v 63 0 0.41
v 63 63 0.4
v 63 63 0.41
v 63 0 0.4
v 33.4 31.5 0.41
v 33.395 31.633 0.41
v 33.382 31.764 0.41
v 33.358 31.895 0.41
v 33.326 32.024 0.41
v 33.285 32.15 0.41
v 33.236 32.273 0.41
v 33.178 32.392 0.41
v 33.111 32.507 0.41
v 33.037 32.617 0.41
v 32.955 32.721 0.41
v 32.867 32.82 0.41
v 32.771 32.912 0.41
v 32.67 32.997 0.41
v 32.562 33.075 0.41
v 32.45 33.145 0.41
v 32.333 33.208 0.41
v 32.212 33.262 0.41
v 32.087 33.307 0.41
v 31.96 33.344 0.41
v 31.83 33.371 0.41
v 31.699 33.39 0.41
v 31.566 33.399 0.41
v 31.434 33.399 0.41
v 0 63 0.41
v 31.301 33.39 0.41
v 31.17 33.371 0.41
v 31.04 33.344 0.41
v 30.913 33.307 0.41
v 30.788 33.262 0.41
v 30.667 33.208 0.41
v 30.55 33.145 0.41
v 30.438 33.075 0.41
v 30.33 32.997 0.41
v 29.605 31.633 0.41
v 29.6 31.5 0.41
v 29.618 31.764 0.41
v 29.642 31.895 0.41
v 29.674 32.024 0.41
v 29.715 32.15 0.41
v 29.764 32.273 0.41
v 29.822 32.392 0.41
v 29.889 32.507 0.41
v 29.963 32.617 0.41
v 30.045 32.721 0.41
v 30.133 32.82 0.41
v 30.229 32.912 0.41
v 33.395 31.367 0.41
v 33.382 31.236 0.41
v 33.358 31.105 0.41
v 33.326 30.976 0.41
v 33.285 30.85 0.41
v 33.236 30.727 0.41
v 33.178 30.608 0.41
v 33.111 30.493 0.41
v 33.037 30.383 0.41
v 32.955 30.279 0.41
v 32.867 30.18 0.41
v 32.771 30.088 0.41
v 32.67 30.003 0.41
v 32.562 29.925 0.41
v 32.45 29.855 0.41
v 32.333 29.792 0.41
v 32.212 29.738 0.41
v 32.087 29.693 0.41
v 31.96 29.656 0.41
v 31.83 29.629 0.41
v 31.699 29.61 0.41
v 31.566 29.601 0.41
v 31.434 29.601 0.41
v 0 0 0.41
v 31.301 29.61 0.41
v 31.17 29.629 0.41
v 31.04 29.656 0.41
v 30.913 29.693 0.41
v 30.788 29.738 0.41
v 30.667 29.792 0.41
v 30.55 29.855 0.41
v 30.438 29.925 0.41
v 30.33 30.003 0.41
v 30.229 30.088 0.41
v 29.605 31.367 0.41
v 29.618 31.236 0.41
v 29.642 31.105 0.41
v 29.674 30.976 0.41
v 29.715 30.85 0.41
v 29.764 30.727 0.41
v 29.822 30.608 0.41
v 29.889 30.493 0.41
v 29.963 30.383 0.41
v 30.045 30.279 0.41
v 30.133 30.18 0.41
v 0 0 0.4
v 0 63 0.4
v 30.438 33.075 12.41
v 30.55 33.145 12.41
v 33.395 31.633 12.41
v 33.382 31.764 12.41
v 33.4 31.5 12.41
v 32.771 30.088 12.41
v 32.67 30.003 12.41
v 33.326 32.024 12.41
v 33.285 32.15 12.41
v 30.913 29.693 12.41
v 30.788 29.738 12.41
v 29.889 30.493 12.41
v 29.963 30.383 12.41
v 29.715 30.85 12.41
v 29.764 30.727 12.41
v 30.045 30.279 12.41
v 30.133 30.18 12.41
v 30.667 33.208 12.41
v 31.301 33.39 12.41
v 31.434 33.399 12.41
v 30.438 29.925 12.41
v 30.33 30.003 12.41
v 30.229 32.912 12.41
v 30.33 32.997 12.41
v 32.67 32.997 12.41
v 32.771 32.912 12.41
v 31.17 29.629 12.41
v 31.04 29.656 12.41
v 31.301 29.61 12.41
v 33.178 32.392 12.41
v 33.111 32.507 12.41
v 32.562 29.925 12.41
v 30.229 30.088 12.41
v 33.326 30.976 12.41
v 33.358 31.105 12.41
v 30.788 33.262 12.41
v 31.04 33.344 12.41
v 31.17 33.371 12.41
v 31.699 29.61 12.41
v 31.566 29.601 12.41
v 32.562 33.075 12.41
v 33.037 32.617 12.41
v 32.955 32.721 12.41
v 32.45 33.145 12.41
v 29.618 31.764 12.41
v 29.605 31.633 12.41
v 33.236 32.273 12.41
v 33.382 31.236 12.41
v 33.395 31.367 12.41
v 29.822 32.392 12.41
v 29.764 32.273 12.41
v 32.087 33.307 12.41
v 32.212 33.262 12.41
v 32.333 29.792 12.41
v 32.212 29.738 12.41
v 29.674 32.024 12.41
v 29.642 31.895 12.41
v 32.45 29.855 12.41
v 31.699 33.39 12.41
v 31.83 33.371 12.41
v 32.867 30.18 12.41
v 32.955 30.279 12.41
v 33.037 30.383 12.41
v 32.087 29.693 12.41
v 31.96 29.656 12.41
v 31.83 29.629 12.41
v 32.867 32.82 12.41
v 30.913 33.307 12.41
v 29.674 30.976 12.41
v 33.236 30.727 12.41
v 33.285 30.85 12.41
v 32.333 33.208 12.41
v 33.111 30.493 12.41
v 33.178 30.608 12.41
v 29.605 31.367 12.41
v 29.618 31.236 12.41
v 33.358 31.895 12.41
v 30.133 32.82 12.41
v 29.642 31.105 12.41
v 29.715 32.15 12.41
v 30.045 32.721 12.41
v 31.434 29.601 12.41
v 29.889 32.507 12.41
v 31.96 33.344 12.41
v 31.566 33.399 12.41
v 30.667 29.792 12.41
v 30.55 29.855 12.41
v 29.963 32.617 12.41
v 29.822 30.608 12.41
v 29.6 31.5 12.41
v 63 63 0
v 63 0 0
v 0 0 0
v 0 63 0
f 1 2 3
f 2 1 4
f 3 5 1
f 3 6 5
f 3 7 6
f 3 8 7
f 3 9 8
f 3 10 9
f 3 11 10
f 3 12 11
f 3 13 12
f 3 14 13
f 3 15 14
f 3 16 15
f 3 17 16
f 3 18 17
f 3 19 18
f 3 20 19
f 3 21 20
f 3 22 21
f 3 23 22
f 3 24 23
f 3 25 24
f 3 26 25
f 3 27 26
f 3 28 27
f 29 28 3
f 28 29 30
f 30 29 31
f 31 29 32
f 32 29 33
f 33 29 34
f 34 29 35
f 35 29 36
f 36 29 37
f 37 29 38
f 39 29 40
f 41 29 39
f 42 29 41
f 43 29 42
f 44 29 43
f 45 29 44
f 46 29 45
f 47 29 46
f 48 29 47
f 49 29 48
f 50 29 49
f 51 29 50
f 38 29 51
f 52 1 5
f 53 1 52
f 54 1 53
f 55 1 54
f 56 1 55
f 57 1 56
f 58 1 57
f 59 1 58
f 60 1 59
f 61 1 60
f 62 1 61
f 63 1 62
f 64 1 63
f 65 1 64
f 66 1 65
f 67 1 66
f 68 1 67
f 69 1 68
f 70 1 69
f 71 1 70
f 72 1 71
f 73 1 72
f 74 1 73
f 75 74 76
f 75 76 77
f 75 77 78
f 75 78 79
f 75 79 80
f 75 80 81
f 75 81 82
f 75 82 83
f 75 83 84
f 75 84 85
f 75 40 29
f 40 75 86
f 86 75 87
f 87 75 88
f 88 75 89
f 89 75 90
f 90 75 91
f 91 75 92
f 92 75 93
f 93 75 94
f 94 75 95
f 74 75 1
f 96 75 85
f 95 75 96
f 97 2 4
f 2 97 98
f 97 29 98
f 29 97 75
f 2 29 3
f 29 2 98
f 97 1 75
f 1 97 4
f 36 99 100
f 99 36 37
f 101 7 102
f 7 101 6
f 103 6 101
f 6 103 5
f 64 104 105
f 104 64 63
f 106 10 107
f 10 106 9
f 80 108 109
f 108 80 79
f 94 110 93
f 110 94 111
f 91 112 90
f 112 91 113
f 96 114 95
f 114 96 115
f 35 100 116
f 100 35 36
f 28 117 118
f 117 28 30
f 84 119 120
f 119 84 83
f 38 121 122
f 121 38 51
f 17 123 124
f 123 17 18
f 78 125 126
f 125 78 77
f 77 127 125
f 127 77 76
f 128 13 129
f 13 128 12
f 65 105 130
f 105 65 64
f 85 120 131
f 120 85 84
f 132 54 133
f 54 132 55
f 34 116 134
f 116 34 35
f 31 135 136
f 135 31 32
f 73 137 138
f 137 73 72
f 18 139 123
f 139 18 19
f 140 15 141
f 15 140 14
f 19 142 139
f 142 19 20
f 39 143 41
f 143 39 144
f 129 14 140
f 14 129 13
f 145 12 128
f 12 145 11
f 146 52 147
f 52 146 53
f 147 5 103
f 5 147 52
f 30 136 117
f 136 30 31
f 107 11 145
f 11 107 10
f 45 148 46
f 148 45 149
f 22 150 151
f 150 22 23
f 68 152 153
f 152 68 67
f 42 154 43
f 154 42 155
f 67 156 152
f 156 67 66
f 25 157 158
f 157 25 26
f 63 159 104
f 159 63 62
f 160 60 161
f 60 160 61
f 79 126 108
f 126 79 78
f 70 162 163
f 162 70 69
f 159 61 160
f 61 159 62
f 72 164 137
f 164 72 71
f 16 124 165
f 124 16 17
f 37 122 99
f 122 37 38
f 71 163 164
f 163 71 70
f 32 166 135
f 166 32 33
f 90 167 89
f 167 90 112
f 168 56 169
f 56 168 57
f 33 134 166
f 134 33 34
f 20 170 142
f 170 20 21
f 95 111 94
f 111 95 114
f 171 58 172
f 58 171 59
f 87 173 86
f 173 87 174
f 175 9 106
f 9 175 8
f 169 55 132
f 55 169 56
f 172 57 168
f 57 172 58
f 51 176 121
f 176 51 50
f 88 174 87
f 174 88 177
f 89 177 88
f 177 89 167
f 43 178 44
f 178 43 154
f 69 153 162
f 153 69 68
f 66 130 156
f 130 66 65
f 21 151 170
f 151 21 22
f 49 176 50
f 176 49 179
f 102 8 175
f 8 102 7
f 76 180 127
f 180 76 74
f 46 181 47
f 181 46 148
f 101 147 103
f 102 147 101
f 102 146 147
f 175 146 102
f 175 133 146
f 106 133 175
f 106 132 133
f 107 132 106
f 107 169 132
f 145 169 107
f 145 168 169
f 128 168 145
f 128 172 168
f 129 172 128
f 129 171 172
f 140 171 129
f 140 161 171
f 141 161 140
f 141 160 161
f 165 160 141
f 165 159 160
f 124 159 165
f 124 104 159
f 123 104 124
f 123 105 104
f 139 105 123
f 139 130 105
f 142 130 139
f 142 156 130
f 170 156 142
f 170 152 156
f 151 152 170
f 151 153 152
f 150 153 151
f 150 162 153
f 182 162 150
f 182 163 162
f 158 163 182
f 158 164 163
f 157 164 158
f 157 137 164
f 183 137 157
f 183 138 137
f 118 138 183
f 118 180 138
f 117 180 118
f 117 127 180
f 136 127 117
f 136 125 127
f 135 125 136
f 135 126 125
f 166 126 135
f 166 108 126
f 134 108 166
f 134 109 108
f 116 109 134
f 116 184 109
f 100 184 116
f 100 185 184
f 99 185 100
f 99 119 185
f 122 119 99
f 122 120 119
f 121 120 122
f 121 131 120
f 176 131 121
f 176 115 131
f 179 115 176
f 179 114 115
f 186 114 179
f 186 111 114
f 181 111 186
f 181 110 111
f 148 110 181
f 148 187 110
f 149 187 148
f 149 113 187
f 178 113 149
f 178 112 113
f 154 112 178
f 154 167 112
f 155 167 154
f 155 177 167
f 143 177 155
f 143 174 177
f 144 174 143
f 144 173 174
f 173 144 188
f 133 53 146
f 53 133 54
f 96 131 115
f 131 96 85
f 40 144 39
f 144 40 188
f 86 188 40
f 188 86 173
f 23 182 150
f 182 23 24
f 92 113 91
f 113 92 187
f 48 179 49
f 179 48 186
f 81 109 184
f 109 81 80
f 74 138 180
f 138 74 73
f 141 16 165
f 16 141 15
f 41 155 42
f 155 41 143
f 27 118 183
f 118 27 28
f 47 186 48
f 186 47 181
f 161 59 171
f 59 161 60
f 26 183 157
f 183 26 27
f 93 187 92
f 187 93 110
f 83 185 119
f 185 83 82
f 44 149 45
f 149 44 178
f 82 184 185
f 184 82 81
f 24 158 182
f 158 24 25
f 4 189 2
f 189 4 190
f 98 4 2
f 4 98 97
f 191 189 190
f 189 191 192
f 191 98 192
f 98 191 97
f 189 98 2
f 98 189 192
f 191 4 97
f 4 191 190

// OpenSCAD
// file: ../../Base/Rotation.scad
// Fischertechnik Box Foundation
// Geometry Helpers Rotation

include <PlacementOptions.scad>

// getRotatedSpace(space, rotation=NoRotation)
// Rotates the space dependent on the specified rotation

function getRotatedSpace(space, rotation=NoRotation) = [
    (rotation == Rotate90 || rotation == Rotate270) ? space.y : space.x,
    (rotation == Rotate90 || rotation == Rotate270) ? space.x : space.y
];

// Rotates the given space around the fixed left lower corner
// space = the space the children needs as width/depth list [width,depth]
// rotation = 0 Rotate0 degrees, 1 Rotate90 degrees, 2 Rotate180 degrees, 3 Rotate270 degrees (equivalent to -90)

module RotateFix(space, rotation=NoRotation) {
    dy = (rotation == Rotate0 || rotation == Rotate270) ? 0 :
        (rotation == Rotate90) ? space.x :
        space.y;
    dx = (rotation < Rotate180) ? 0 :
        (rotation == Rotate180) ? space.x :
        space.y;
    
    translate([dx, dy, 0])
        rotate([0, 0, rotations[rotation]])
            children();
}
// file: ../../Base/Alignment.scad
// Fischertechnik Box Foundation
// Geometry Helpers Alignment

include <PlacementOptions.scad>

// getAlignedX(elementWidth, spaceWidth, align=AlignRight, offset=0)
// Gets the aligned X offset of an element with the given
// width in the given space.
// elementWidth = The width of the element to positon
// spaceWidth = The space where the element should be aligned
// align = 0 AlignLeft, 1 AlignCenter, 2 AlignRight
// offset = an optional offset from the aligned position. When
// aligned left or centered, then positive values are in X direction.
// When aligned right then positive values are in negative X direction.

function getAlignedX(elementWidth, spaceWidth, align=AlignRight, offset=0) =
    (align == AlignLeft) ?
        offset :
        ((align == AlignCenter) ?
        (spaceWidth - elementWidth)/2 + offset :
        spaceWidth - offset - elementWidth);

// getAlignedY(elementDepth, spaceDepth, align=AlignTop, offset=0)
// Gets the aligned Y offset of an element with the given
// depth in the given space.
// elementDepth = The depth of the element to positon
// spaceDepth = The space where the element should be aligned
// align = 0 AlignBottom, 1 AlignCenter, 2 AlignTop
// offset = an optional offset from the aligned position. When
// aligned bottom or centered, then positive values are in Y direction.
// When aligned top then positive values are in negative Y direction.

function getAlignedY(elementDepth, spaceDepth, align=AlignTop, offset=0) =
    (align == AlignBottom) ?
        offset :
        ((align == AlignCenter) ?
        (spaceDepth - elementDepth)/2 + offset :
        spaceDepth - offset - elementDepth);
// file: ../../Base/PlacementOptions.scad
// Fischertechnik Box Foundation
// Placement Options

// Alignment
NoAlign = 0;
AlignLeft = 1;
AlignBottom = 2;
AlignCenter = 3;
AlignRight = 4;
AlignTop = 5;

// Element rotation degree steps
rotations = [0, -90, -180, -270];

// Rotation
NoRotation = 0;
Rotate0 = 0;
Rotate90 = 1;
Rotate180 = 2;
Rotate270 = 3;

// Docking (seen from above)
NoDock = -1;
DockLeft = 0;
DockTop = 1;
DockRight = 2;
DockCorner = 2;
DockBottom = 3;

// Web corners
LowerLeft = 0;
UpperLeft = 1;
UpperRight = 2;
LowerRight = 3;

// Web position relative to corner
LeftOfCorner = 0;
RightOfCorner = 1;
// file: ../../Base/Boxes.scad
// Fischertechnik Box Foundation
// Pre-designed Boxes

use <Constants.scad>

include <PlacementOptions.scad>

box190Width = 190;
box190Depth = 130;
box130Width = 130;
box130Depth = 95;

// Values are from an original ec3 box
topBottomDifference = 1.5;
outerHeight = 40;
innerHeight = 38.2;
baseThickness = outerHeight - innerHeight;
stackExcess = 5.7;
radius = 3.5;
wallThickness = 1.5;
tolerance = 0.2;
stackOffset = innerHeight - stackExcess;

boxUsageHeight = stackOffset;
boxWallThickness = wallThickness;
boxBaseThickness = baseThickness;
boxWebWidth = 3.0;

// getBoxWallThickness()
// Gets the wall thickness of a Fischertechnik Box
function getBoxWallThickness() = boxWallThickness;

// getBoxUsageHeight()
// Gets the usable height of a Fischertechnik box
function getBoxUsageHeight() = boxUsageHeight;

// getBoxInnerHeight()
// Gets the inner height of a Fischertechnik box, including the stack excess
function getBoxInnerHeight() = innerHeight;

// getBoxBaseThickness()
// Gets the thickness of the Fischertechnik box base.
function getBoxBaseThickness() = boxBaseThickness;

// getBoxWebWidth()
// Gets the width of a box web
function getBoxWebWidth() = boxWebWidth;

// getBox190Space()
// Gets the usable inner space of a Box 190 as an x/y-list
function getBox190Space() = [
    box190Width - 2*getBoxWallThickness() - topBottomDifference, 
    box190Depth - 2*getBoxWallThickness() - topBottomDifference ];

// BoxBase(width, depth)
// Creates an empty stackable Fischertechnik compatible box
// width = Outer width of the box (190, 130, ...)
// depth = Outer depth of the box (130, 95, ...)

module BoxBase(width, depth, height=outerHeight) {    
    thinPlate = 0.01;

    innerHeight = height - baseThickness;    
    
    module BodyPlate(width, depth) {
        translate([radius, radius])
        hull() {
            w = width-2*radius;
            d = depth-2*radius;
            cube([w, d, thinPlate]);
            cylinder(thinPlate, r=radius, $fn=getFragments());
            translate([w, 0])
                cylinder(thinPlate, r=radius, $fn=getFragments());
            translate([w, d])
                cylinder(thinPlate, r=radius, $fn=getFragments());
            translate([0, d])
                cylinder(thinPlate, r=radius, $fn=getFragments());
        }
    }
    
    module Body(tolerance=tolerance) {
        hull() {
            // Bottom with tolerance to fit into the original boxes when stacked
            translate([-wallThickness+tolerance, -wallThickness+tolerance, -baseThickness])
                BodyPlate(width-topBottomDifference-2*tolerance, depth-topBottomDifference-2*tolerance);
            
            // Top
            translate([-wallThickness-topBottomDifference/2, -wallThickness-topBottomDifference/2, innerHeight-thinPlate])
                BodyPlate(width, depth);
         }
    }

    module Cutoff() {
        hull() {
            coWidth = width - 2*wallThickness;
            coDepth = depth - 2*wallThickness;
            
            // Bottom
            BodyPlate(coWidth-topBottomDifference, coDepth-topBottomDifference);

            // Top
            translate([-topBottomDifference/2, -topBottomDifference/2, innerHeight+thinPlate]) 
                BodyPlate(coWidth, coDepth);
        }
    }
    
    difference() {        
        Body();
        Cutoff();
        stackOffset = innerHeight - stackExcess;
        translate([0, 0, stackOffset + baseThickness])
            Body(tolerance=0);
    }
}

// Creates the Fischertechnik empty box 130x190 mm and places it at position 0,0
// 190x130 are the outer sizes, the inner space is slightly smaller. Use getBox190Space() to get the inner sizes.
// The box is positioned that the usable inner space is at the 0,0,0 position. The

module Box190() {
    BoxBase(box190Width, box190Depth);
}

// Gets the usable inner space of a Box 130 as an x/y-list
function getBox130Space() = [
    box130Width - 2*getBoxWallThickness() - topBottomDifference, 
    box130Depth - 2*getBoxWallThickness() - topBottomDifference ];

// Creates the Fischertechnik empty box 95x130 mm and places it at position 0,0
// 190x130 are the outer sizes, the inner space is slightly smaller. Use getBox190Space() to get the inner sizes.
// The box is positioned that the usable inner space is at the 0,0,0 position. The

module Box130() {
    BoxBase(box130Width, box130Depth);
}

// Creates a web at the specified box walls
// corner 0 = LowerLeft, 1 = UpperLeft, 2 = UpperRight, 3 = LowerRight
// side 0 = LeftOfCorner, 1 = RightOfCorner
// distance = Distance in mm from the corner
// boxSpace = inner width and depth of the box (default: Box 190)
// webWidth = length of the web (default is 3 mms)
// webThickness = thickness of the web (default is 1 mm)

module BoxWeb(corner, side, distance, boxSpace=getBox190Space(), webWidth=getBoxWebWidth(), webThickness=1.0) {
    sink = getBoxWallThickness()/2;

    width = (corner % 2 == 0) ? 
            (side == LeftOfCorner ? webWidth : webThickness) :
            (side == LeftOfCorner ? webThickness : webWidth);

    depth = (corner % 2 == 0) ? 
            (side == RightOfCorner ? webWidth : webThickness) :
            (side == RightOfCorner ? webThickness : webWidth);
    
    xDiff = corner == LowerLeft ? 
                (side == LeftOfCorner ? -sink : distance) :
            (corner == UpperLeft ?                
                (side == LeftOfCorner ? distance : -sink) :
            (corner == UpperRight ?
                (side == LeftOfCorner ? boxSpace.x-webWidth+sink : boxSpace.x-distance-webThickness) :
                (side == LeftOfCorner ? boxSpace.x-distance-webThickness: boxSpace.x-webWidth+sink)));

    yDiff = corner == LowerLeft ? 
                (side == RightOfCorner ? -sink : distance) :
            (corner == UpperLeft ?
                (side == RightOfCorner ? boxSpace.y-distance : boxSpace.y-webWidth+sink) :
            (corner == UpperRight ?
                (side == RightOfCorner ? boxSpace.y-webWidth+sink : boxSpace.y-distance) :
                (side == RightOfCorner ? distance : -sink)));
    
    translate([xDiff, yDiff, -getExcess()])
        cube([width, depth, boxUsageHeight + 2*getExcess()]);
}
// file: ../../Base/Placement.scad
// Fischertechnik Box Foundation
// Geometry Helpers Placement

use <Constants.scad>
use <Alignment.scad>
use <Rotation.scad>
use <Boxes.scad>

include <PlacementOptions.scad>

// Place(x=0, y=0, elementSpace=[0,0], alignX=AlignLeft, alignY=AlignBottom, rotation=Rotate0, boxSpace=getBox190Space())
// Places the child at the specified position
// y = Y-Position. This is a relative position when an X aligment is specified.
// x = X-Position. This is a relative position when an Y aligment is specified.
// elementSpace = space of the element to be placed [x,y]
// alignX = -1=NoAlign, 0 AlignLeft, 1 AlignCenter, 3 AlignRight (elementSpace and boxSpace required!)
// alignY = -1=NoAlign, 2 AlignBottom, 1 AlignCenter, 4 AlignTop (elementSpace and boxSpace required!)
// rotation = 0 Rotate0 0 degrees, 1 Rotate90 90 degrees, 
// 2 Rotate180 180 degrees, 3 Rotate270 270 degrees (equivalent to -90)
// boxSpace = Inner space of the box where the placement occurs [x,y] - default is Box 190x130 inner space

module Place(x=0, y=0, elementSpace=[0,0], 
  alignX=AlignLeft, alignY=AlignBottom, 
  rotation=NoRotation, boxSpace=getBox190Space()) {

    module Position(x, y, space, rotation=Rotate0) {
        translate([x, y, 0])
            RotateFix(space, rotation)
                children();
    }

    space = getRotatedSpace(elementSpace, rotation);
    alignedX = getAlignedX(space.x, boxSpace.x, alignX, x);
    alignedY = getAlignedY(space.y, boxSpace.y, alignY, y);
    Position(alignedX, alignedY, elementSpace, rotation)
        children();
}

// Center(space=getBox130Space(), elementSpace=[0,0])
// space = Space where the children is centered. For cylinder use centered=true and no elementSpace.
// elementSpace = space of the element to be centered [x,y]

module Center(space=getBox190Space(), elementSpace=[0,0]) {
    Place(elementSpace=elementSpace, boxSpace=space, alignX=AlignCenter, alignY=AlignCenter)
        children();
}

// CenterHorizontal(width=0, y=0, offset=0, space=getBox130Space())
// width = Width of the element to be placed.
// y = Y position of the element
// offset = Offset from the center position (negative will be left of the center)
// space = Space where the element is placed

module CenterHorizontal(width=0, y=0, offset=0, space=getBox190Space()) {
    Place(x=offset, y=y, elementSpace=[width, 0], boxSpace=space, alignX=AlignCenter)
        children(0);
}

// CenterVertical(depth=0, x=0, offset=0, space=getBox130Space())
// depth = Depth of the element to be placed.
// x = X position of the element
// offset = Offset from the center position (negative will be down of the center)
// space = Space where the element is placed

module CenterVertical(depth=0, x=0, offset=0, space=getBox190Space()) {
    Place(x=x, y=offset, elementSpace=[0, depth], boxSpace=space, alignY=AlignCenter)
        children(0);
}

// getIsVertical(align)
// True if the specified alignment needs a vertical orientation for a divider (AlignRight, AlignLeft)

function getIsVertical(align) = (align == AlignRight || align == AlignLeft);

// getIsHorizontal(align)
// True if the specified alignment needs a horizontal orientation for a divider (AlignTop, AlignBottom)

function getIsHorizontal(align) = (align == AlignTop || align == AlignBottom);
// file: ../../Elements/AxisClip10.scad
// Fischertechnik Box Library
// Axis for clip 10
// 31023

use <../ModelBase/Simple.scad>
use <../Base/Constants.scad>

/* [Element Parameters] */
height = 23;
clipHeight = 10;

/* [Hidden] */
width = 12;
depth = 12;
upperDiameter = 3.6;

// getAxisClip10Space()
// Gets the space of a n axis for a clip 10 with spring ring (mot2)

function getAxisClip10Space() = [width, depth, height];

// AxisClip10(height, clipHeight)
// Axis for clip 10 with spring ring (mot2)
// height = Height of the complete axis (standard is 23, in mot3 its only 12)
// clipHeight = Height of the part for the clip (standard is 10, in mot3 its only 7)

module AxisClip10(height=height, clipHeight=clipHeight) {
    LeveledAxisWithSpace(height, height-clipHeight, getAxisClip10Space(), diameter=upperDiameter);
}

// Test
color("lightgray")
AxisClip10(height, clipHeight);
// file: ../../Base/Constants.scad
// Fischertechnik Box Foundation
// Constants

// Constant values necessary for multiple elements

// Base constants
dividerThickness = 1.2;
excess = 0.01;
fragments = 90;
tolerance = 0.8;

// Gets the thickness of a divider 
function getDividerThickness() = dividerThickness;

// Gets the excess that is used to merge walls into each other
function getExcess() = excess;

// Gets amount of fragments of a cylinder
function getFragments() = fragments;

// Gets the inner tolerance of a frame to each side
function getTolerance() = tolerance;


// Fischertechnik specific constants
axisDiameter = 4;
axisBottomDiameter = axisDiameter + 1;
axisTolerance = 0.2;

// Gets axis diameter of Fischertechnik axis
function getAxisDiameter() = axisDiameter;

// Gets axis diameter tolerance (subtracted for element axis)
function getAxisTolerance() = axisTolerance;

// Gets the axis diameter for standing axis
function getStandAxisDiameter() = getAxisDiameter() - getAxisTolerance();

// Gets axis bottom diameter for thicker part at the bottom
function getAxisBottomDiameter() = axisBottomDiameter;

standardEdgeDistance = 2.5;
standardWebDistance = 11.5;
standardCornerLength = 15;

// gets the standard distance to the wall of the box for dockable frames with webs
function getStandardEdgeDistance() = standardEdgeDistance;

// gets the standard distance of each web to the corner of the dockable frame
function getStandardWebDistance() = standardWebDistance;

// gets the standard length of the corner walls of a dockable frame
function getStandardCornerLength() = standardCornerLength;

tubeWallFactor = 0.8;

// gets the wall thickness of a tube.
function getTubeWallThickness() = tubeWallFactor * getDividerThickness();

smallPartsFrameHeight = 20;

// gets the frame height for docked small parts boxes.
function getSmallPartsFrameHeight() = smallPartsFrameHeight;

hubRingDiameter = 19.5;
hubRingLevelDiameter = 21;

// gets the diameter of a tube matching the inner ring of a wheel
function getHubRingDiameter() = hubRingDiameter;

// gets the diameter of a hub tube with a thicker diameter
function getHubRingLevelDiameter() = hubRingLevelDiameter;
// file: ../../Elements/AxisFlatHubWithGearZ40.scad
// Fischertechnik Box Library
// Axis for gear wheel Z40 with flat hub
// 31022, 31015

use <../ModelBase/Simple.scad>
use <../Base/Constants.scad>

/* [Hidden] */
width = 63;
depth = 63;
height = 12;

// getAxisFlatHubWithGearZ40Space()
// Gets the space of an axis for a gear wheel with Z40

function getAxisFlatHubWithGearZ40Space() = [width, depth, height];

// AxisFlatHubWithGearZ40()
// Axis for gear Z40 with flat hub

module AxisFlatHubWithGearZ40() {
    AxisWithSpace(height, getAxisFlatHubWithGearZ40Space());
}

// Test
color("lightgray")
AxisFlatHubWithGearZ40();
// file: ../TestPrint.scad
// 3D Print Test Base

use <../Base/Constants.scad>

use <../Elements/AxisClip10.scad>

module TestPrint(elementSpace) {
    cube([elementSpace.x, elementSpace.y, 0.4]);
    translate([0,0,0.4+getExcess()]) {
        children();
    }
}

TestPrint(getAxisClip10Space())
    AxisClip10();
// main file
// 3D Print Test
// AxisFlatHubWithGearZ40

use <../TestPrint.scad>
use <../../Elements/AxisFlatHubWithGearZ40.scad>

TestPrint(getAxisFlatHubWithGearZ40Space())
    AxisFlatHubWithGearZ40();
